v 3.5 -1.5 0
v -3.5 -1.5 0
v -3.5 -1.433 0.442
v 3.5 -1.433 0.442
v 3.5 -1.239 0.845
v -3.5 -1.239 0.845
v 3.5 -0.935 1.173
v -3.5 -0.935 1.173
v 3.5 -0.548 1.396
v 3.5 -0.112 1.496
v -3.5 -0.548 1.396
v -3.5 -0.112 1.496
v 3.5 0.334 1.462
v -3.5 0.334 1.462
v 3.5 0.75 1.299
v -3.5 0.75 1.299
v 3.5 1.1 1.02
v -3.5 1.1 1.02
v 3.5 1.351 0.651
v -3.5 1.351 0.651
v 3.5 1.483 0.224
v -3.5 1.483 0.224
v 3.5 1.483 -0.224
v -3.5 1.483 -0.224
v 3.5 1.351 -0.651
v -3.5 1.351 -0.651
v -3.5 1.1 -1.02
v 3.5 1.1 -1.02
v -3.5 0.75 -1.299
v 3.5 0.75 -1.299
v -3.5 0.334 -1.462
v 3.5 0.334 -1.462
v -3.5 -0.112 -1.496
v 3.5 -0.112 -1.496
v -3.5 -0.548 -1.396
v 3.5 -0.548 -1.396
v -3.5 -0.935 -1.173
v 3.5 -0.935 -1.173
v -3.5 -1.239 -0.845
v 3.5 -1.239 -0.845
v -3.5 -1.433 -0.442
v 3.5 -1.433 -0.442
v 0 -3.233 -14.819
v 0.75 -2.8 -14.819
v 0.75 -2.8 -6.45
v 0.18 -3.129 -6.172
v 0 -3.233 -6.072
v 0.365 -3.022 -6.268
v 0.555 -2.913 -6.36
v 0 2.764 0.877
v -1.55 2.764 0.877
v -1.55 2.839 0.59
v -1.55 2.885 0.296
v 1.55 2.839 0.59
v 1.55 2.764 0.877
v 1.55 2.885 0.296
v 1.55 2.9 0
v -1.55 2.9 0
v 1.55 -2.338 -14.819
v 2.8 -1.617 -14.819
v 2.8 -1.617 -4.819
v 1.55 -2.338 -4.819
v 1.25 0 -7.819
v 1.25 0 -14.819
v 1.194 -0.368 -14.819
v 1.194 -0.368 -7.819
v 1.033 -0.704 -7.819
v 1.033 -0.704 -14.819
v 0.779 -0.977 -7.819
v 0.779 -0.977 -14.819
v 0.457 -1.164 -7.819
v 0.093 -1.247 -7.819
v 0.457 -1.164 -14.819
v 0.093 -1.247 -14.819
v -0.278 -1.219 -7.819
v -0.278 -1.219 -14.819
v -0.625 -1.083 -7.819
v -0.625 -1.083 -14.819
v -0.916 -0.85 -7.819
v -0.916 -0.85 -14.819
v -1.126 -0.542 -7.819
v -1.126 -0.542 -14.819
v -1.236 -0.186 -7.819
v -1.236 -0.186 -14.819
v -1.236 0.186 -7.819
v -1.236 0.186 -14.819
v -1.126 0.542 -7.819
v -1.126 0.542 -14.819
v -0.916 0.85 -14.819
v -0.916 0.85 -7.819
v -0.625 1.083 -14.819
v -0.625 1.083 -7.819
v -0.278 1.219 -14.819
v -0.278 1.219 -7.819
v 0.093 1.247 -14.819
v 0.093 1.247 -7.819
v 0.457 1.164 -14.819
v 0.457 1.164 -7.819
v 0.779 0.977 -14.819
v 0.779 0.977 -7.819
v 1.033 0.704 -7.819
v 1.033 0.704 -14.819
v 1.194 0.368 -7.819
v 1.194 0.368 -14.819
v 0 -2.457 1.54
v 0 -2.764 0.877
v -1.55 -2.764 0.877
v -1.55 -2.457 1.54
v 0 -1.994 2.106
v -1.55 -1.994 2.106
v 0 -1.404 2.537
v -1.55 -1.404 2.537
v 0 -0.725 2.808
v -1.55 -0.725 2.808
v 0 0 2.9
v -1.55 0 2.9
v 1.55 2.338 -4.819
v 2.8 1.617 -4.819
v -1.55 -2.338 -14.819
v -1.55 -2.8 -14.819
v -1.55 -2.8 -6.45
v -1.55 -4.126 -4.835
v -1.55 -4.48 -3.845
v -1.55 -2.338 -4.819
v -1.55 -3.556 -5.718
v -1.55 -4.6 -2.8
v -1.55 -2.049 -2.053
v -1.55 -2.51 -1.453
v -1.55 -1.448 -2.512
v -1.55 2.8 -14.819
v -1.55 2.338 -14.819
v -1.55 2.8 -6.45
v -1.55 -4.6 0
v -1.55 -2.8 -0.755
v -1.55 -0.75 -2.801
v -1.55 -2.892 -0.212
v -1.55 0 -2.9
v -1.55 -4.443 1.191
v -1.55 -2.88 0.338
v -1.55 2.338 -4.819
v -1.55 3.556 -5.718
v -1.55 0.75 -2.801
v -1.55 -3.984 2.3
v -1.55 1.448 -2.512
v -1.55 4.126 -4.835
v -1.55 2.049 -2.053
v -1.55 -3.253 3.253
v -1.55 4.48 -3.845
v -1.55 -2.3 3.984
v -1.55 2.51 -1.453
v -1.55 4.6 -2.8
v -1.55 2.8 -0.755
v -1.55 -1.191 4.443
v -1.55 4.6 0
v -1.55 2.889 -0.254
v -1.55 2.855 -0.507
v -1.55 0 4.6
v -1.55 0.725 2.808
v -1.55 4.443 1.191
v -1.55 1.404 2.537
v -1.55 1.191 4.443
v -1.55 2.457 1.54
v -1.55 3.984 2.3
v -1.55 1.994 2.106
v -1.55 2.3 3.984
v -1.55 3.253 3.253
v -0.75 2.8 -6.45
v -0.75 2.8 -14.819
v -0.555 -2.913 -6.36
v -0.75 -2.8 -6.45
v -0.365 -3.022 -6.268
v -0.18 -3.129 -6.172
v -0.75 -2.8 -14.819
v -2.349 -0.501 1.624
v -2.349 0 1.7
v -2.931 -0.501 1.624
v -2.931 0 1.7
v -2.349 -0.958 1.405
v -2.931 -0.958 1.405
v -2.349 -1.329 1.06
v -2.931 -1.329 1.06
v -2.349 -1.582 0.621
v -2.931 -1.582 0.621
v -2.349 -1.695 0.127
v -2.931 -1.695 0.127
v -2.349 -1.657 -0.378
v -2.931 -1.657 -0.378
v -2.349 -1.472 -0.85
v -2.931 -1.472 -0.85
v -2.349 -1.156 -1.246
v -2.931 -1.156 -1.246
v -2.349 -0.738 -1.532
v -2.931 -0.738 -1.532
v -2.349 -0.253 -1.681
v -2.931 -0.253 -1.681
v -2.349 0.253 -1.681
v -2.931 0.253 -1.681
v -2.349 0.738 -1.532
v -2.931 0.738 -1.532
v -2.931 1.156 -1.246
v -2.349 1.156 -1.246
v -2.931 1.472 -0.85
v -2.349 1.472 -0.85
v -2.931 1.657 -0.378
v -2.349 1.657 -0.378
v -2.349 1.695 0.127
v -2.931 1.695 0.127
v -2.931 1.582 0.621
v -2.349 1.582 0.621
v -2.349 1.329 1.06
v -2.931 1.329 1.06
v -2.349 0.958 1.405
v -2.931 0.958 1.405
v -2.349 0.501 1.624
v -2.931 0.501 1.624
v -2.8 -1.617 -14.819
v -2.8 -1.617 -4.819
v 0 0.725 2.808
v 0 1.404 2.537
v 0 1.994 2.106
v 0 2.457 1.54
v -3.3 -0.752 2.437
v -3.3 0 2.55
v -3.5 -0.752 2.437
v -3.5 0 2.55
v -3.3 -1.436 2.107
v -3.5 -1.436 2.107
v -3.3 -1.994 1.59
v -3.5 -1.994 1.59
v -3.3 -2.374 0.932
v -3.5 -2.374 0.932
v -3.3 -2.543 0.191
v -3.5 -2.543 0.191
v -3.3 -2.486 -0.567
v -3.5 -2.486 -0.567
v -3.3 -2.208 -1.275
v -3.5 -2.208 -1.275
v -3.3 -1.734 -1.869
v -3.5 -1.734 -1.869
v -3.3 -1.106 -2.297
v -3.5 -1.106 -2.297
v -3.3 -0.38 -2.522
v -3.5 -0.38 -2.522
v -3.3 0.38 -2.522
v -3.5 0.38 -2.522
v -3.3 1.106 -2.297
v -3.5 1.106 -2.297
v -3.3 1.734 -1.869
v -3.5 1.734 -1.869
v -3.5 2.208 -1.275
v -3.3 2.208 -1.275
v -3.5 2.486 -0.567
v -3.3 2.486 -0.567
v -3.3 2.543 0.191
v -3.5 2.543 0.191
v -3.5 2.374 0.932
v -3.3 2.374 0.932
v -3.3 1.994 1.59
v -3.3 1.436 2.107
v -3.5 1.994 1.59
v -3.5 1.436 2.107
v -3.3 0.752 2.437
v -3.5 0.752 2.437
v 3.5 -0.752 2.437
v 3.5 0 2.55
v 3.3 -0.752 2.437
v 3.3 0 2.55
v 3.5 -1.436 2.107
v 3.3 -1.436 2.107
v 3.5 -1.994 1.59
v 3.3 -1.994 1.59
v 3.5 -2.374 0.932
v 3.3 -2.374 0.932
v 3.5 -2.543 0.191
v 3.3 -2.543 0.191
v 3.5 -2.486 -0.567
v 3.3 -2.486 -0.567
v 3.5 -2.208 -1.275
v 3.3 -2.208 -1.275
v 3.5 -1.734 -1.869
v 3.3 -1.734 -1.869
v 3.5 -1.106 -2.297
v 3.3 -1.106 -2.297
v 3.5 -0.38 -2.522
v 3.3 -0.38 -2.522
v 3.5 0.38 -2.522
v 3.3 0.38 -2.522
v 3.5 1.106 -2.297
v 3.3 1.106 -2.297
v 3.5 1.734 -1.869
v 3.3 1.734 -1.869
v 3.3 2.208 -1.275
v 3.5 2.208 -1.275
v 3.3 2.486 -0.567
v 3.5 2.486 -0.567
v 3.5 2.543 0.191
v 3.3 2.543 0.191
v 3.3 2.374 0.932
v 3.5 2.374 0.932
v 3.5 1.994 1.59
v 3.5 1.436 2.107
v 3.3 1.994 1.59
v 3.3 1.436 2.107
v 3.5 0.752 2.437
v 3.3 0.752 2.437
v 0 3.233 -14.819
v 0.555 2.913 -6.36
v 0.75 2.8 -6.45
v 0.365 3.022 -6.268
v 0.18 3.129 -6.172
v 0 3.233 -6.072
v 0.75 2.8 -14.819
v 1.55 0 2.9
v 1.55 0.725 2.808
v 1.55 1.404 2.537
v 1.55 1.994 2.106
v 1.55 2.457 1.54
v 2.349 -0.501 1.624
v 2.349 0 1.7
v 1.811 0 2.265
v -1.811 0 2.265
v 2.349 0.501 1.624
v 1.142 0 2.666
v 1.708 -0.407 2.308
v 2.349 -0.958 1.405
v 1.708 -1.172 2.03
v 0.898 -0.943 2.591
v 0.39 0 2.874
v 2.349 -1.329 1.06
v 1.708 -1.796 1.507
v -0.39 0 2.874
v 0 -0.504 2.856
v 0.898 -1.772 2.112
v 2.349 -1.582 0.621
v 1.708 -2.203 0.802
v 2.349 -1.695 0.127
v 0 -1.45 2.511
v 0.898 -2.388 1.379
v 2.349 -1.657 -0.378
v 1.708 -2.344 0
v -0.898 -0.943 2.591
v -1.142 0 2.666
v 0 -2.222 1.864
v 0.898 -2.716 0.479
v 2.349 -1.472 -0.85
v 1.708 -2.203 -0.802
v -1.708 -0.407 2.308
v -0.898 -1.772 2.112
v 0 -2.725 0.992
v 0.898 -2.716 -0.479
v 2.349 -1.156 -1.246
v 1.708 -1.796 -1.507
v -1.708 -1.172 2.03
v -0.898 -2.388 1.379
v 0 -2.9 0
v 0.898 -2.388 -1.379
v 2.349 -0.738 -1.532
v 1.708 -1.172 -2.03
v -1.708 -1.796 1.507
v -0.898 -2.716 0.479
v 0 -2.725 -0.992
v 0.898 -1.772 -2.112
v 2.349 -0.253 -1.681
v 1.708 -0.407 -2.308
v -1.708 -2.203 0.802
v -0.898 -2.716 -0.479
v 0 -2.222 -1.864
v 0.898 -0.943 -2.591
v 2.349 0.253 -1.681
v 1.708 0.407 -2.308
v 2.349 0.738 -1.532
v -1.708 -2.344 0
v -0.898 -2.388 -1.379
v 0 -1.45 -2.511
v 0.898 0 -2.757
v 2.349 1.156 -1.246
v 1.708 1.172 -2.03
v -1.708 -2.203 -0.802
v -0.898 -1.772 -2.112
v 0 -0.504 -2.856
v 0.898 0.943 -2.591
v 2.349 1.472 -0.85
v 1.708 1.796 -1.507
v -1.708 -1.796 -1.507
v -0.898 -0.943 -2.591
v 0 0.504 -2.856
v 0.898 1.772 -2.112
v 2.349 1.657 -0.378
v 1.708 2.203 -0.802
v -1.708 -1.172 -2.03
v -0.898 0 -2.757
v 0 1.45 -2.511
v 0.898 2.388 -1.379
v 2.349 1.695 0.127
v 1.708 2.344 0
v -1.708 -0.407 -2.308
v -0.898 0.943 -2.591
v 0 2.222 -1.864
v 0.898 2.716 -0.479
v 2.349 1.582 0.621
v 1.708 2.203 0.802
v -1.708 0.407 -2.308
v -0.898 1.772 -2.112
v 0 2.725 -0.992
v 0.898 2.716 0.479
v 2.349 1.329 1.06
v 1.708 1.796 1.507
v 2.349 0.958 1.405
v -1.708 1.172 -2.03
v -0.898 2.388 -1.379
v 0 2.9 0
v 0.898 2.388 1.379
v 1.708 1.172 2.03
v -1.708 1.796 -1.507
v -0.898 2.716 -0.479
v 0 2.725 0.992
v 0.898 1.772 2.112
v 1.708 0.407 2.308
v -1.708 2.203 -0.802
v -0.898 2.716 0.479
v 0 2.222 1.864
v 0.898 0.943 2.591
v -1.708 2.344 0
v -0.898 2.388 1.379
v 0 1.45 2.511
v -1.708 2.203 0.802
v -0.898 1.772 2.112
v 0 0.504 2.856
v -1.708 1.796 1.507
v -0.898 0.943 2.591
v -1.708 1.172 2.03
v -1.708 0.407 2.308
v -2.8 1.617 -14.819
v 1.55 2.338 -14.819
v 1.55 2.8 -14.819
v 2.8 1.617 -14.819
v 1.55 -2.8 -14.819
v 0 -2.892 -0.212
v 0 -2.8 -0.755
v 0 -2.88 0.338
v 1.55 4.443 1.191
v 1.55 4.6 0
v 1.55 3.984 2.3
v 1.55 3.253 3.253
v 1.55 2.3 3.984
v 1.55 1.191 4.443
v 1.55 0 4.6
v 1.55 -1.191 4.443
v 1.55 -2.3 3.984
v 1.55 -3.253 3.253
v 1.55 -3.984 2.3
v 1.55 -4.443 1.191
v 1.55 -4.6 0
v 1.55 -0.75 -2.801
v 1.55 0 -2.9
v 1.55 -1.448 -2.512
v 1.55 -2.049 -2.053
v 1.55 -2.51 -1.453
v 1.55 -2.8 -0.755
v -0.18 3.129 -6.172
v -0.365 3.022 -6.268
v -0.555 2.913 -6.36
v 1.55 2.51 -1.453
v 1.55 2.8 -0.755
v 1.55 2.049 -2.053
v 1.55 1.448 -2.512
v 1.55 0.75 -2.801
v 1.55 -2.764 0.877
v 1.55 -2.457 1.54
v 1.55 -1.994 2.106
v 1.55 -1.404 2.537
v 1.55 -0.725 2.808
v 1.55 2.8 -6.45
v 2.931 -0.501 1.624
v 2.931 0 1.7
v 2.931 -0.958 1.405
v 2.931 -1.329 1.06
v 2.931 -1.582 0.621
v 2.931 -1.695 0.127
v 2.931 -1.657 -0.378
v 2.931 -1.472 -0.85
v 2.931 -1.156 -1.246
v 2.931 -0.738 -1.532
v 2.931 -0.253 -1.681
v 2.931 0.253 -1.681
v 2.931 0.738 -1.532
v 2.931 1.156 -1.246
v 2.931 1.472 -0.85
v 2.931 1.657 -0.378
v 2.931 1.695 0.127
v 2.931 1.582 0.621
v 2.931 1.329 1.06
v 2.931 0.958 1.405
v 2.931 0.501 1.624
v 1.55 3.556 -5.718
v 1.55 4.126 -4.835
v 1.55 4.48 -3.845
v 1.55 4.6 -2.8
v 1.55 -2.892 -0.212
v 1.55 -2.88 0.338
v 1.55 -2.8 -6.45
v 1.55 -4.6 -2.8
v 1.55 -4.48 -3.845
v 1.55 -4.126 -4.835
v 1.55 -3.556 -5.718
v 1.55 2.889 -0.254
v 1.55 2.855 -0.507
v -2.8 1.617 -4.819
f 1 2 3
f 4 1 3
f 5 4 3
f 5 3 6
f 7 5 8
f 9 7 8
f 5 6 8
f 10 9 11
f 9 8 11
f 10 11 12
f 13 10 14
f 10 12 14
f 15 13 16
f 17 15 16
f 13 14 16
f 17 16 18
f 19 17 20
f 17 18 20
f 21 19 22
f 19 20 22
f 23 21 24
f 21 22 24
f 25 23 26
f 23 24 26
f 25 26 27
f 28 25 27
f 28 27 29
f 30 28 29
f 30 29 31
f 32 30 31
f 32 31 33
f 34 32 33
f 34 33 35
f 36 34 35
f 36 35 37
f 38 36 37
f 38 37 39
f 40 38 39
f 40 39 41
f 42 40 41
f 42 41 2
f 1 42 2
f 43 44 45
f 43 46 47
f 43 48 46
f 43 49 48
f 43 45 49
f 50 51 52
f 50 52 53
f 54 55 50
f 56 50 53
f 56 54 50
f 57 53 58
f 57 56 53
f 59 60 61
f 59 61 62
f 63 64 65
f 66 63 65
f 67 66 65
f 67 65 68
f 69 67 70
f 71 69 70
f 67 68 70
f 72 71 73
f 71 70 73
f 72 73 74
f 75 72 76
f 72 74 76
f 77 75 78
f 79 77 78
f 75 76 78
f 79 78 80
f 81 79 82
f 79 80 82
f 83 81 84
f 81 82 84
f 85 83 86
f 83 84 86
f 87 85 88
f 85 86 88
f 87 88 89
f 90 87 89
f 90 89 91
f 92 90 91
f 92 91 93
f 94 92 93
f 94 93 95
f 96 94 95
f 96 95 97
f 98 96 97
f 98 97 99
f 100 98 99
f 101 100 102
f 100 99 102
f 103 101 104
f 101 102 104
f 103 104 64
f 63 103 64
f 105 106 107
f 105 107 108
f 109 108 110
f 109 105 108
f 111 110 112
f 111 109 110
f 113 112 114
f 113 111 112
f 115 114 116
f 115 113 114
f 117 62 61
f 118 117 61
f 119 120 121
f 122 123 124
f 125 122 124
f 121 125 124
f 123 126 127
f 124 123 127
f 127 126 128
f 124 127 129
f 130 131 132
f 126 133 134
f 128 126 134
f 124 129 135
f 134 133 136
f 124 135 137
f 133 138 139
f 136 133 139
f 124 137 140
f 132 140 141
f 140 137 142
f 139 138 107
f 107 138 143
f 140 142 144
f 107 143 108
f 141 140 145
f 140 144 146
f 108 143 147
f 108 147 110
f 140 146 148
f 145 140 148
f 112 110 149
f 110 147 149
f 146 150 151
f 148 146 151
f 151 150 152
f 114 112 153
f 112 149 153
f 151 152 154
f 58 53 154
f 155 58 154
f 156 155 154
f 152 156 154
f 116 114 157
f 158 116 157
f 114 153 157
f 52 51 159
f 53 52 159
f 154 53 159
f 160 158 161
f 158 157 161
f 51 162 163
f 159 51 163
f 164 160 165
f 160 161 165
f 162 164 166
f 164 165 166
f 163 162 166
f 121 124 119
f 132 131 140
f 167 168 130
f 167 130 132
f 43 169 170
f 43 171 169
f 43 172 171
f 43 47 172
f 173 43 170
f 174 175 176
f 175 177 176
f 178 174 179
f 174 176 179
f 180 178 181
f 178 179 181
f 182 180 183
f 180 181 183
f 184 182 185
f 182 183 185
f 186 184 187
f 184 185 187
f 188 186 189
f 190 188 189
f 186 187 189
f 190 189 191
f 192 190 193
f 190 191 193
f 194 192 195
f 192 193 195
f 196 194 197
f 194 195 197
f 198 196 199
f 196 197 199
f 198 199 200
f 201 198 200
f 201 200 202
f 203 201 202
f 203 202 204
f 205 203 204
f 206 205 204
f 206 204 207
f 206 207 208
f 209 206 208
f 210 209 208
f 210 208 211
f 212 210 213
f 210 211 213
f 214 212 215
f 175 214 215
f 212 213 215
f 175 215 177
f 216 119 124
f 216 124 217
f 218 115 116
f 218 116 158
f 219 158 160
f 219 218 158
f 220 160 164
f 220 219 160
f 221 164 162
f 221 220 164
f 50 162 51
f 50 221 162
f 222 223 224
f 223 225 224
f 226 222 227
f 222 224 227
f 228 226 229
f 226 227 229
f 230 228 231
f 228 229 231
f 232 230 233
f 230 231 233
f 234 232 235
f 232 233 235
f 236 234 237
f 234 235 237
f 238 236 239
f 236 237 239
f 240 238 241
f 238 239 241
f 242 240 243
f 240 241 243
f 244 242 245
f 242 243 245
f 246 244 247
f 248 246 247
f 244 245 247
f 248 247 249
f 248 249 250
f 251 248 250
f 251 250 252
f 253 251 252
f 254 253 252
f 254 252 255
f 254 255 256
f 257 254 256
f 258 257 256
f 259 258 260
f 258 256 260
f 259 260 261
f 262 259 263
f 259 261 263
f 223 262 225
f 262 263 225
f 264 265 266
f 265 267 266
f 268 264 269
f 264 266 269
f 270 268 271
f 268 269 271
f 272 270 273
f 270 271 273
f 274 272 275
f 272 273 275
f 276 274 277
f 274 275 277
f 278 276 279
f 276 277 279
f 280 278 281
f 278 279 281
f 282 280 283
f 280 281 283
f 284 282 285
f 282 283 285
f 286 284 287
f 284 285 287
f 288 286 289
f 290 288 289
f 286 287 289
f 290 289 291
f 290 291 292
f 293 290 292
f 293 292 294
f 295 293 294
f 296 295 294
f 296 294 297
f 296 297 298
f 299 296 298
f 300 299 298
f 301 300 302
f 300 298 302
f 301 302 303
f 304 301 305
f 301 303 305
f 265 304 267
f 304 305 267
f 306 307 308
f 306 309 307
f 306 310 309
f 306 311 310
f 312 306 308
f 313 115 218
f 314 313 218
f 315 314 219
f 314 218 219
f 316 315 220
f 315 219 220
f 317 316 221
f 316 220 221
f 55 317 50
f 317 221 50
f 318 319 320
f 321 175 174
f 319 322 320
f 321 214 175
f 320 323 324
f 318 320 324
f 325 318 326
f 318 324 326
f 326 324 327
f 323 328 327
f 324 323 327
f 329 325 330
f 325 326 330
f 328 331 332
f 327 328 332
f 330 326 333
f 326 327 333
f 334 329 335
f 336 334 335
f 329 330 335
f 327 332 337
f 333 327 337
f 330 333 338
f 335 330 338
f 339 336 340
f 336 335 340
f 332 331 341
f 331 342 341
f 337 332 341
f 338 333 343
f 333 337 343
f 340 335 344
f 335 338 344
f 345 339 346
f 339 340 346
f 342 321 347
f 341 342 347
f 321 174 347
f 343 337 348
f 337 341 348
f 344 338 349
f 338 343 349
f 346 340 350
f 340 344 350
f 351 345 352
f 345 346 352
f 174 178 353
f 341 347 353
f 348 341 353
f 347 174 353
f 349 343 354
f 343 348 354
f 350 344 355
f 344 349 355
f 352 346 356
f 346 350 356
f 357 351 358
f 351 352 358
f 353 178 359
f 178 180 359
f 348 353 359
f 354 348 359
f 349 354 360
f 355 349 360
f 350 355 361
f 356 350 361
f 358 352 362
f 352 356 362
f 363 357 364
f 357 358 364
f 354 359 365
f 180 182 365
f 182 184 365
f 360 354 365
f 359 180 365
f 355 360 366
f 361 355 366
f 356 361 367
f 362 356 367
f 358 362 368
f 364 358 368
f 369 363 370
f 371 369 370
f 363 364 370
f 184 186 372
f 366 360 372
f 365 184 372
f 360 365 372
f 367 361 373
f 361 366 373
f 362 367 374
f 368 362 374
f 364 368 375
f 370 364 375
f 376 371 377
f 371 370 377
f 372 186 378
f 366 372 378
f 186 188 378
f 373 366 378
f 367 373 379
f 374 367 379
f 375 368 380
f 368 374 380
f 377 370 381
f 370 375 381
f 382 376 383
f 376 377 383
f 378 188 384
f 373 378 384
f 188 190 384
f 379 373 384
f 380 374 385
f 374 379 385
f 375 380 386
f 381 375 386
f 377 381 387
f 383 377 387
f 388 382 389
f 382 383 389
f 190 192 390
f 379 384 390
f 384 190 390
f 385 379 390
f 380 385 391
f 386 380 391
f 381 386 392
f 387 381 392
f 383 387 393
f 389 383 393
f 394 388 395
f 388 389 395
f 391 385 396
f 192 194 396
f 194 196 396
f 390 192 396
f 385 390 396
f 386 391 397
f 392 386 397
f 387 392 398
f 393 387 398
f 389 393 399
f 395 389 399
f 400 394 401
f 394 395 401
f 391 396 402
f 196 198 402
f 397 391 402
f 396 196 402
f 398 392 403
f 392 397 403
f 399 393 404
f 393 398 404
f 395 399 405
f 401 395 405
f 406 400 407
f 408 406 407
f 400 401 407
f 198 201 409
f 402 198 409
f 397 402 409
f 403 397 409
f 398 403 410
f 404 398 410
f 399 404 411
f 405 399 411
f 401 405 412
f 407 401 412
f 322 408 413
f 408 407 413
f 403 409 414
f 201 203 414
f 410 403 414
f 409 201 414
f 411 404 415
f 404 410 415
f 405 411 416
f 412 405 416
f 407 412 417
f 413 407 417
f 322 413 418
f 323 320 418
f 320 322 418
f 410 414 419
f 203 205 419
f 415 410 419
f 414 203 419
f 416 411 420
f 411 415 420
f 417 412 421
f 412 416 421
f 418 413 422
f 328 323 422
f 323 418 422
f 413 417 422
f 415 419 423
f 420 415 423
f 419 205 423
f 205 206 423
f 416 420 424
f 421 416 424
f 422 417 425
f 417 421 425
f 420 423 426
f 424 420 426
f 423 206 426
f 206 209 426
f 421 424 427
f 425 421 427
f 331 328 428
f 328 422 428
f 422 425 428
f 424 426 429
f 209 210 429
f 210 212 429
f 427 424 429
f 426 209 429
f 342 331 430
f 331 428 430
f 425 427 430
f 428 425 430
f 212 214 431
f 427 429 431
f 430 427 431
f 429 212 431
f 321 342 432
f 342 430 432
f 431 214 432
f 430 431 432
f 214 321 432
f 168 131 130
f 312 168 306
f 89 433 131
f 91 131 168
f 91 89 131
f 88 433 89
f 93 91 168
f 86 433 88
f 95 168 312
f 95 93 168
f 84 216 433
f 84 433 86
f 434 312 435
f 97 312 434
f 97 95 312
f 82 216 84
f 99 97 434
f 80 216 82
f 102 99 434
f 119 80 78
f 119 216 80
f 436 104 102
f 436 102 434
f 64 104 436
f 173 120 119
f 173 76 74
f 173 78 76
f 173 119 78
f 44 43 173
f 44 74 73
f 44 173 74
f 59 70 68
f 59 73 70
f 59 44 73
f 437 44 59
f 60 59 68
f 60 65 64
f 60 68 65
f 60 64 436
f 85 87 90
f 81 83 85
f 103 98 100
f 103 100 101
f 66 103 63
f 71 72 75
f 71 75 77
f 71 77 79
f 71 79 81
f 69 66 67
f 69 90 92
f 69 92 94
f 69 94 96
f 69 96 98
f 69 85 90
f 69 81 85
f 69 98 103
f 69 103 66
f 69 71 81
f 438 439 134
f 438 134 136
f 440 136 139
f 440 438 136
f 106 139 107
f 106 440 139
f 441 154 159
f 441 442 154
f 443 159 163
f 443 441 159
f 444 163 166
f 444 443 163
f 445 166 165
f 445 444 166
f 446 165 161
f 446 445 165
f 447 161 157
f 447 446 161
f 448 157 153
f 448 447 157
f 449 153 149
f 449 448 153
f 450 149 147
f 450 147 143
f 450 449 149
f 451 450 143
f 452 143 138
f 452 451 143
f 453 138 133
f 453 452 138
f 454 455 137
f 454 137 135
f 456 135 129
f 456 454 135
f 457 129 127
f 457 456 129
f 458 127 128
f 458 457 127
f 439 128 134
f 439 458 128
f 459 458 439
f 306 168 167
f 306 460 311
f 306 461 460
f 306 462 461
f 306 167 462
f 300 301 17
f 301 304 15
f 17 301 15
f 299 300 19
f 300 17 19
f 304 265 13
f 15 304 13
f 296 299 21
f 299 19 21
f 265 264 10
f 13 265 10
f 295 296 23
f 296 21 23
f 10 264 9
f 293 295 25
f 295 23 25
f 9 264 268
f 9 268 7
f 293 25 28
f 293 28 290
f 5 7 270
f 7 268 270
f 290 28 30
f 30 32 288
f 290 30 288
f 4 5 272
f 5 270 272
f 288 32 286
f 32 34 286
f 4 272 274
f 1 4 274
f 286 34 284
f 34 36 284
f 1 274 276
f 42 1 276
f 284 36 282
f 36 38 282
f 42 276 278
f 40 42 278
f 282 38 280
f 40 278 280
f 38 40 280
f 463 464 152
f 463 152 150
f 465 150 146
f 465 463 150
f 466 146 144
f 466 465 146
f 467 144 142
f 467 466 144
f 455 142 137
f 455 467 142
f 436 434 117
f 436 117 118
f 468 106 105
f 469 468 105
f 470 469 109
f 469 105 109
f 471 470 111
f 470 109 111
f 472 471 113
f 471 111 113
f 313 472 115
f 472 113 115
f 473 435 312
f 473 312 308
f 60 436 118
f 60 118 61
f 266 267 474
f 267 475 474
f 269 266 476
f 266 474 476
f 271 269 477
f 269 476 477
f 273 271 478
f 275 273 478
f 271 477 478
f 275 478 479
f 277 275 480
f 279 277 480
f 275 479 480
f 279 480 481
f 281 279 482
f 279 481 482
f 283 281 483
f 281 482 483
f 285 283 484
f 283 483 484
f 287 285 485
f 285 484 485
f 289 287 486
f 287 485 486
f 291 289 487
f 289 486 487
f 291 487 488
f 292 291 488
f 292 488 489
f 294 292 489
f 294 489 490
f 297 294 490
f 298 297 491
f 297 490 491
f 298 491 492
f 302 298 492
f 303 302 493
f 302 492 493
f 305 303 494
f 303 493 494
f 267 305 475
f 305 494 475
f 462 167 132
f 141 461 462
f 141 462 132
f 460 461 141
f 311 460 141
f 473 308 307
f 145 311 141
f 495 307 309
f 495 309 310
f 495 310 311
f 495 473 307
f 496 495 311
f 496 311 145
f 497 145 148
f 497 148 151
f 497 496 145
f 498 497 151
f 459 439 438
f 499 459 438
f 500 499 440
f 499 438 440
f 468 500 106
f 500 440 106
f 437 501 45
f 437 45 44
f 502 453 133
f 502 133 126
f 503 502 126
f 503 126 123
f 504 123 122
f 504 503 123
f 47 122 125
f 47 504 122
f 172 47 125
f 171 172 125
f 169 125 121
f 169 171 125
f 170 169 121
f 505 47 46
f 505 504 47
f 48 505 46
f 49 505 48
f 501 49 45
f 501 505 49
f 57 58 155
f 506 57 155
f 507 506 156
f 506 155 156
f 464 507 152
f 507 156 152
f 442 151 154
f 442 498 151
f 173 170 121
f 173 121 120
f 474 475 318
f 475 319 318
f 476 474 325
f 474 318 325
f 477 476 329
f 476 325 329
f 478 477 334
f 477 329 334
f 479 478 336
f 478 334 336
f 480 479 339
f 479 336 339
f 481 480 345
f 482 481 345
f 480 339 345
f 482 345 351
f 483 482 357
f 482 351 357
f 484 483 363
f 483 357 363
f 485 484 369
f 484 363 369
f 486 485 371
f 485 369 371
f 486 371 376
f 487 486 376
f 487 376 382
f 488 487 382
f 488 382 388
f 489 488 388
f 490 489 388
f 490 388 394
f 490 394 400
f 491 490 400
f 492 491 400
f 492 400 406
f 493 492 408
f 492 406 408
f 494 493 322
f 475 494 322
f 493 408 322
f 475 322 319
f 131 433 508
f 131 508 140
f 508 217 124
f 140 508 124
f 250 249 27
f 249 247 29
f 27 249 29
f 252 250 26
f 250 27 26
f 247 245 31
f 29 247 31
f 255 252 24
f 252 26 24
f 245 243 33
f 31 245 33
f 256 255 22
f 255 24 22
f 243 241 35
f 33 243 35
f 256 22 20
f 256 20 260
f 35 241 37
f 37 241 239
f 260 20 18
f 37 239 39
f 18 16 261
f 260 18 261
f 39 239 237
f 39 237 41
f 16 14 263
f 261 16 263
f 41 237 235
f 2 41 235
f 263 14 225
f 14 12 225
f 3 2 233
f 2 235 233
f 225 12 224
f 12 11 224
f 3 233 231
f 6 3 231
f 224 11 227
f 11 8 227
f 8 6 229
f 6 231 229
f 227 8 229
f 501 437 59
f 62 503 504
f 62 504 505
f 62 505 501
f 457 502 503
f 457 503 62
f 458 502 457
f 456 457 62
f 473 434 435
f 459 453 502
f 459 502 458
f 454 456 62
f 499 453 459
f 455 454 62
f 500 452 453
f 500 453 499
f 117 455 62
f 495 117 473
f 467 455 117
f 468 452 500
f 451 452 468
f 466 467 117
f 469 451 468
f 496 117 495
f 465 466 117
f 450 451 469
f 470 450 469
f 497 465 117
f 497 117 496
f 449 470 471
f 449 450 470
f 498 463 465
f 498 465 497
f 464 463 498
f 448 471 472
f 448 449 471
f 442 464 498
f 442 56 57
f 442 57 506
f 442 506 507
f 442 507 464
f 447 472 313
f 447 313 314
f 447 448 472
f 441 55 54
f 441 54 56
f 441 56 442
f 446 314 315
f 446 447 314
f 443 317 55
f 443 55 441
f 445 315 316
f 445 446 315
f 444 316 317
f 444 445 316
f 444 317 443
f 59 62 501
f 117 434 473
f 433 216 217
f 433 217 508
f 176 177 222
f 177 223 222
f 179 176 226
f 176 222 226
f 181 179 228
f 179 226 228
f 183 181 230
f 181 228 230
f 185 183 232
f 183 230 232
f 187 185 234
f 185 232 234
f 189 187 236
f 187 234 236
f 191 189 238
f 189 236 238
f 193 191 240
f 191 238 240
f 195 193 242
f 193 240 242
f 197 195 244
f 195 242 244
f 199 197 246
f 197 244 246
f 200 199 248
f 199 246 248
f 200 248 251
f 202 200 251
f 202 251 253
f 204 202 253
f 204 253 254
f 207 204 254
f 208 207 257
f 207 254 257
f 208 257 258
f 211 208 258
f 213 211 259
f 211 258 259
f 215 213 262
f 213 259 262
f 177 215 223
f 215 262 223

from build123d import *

# Parameters (mm, degrees)
F2_R     = 1.5
F3_DEPTH = 7.001
F5_DEPTH = 1.55
F7_DEPTH = 10
F6_R     = 1.25
F8_DEPTH = 7


# Not quite as in the source:
# - a feature names something its author has since deleted; it is built from what else it names


with BuildPart() as f1:
    # F0 (on Front) → F1 (revolve)
    with BuildSketch(Plane.XZ):
        with BuildLine():
            ThreePointArc((2.3494680249, 1.7), (2.7589361421, 0.8934603315), (2.9, 0))
            Line((2.9, 0), (3.5, 0))
            Line((3.5, 0), (3.5, 2.55))
            Line((3.5, 2.55), (3.3, 2.55))
            Line((3.3, 2.55), (2.9305491433, 1.7))
            Line((2.9305491433, 1.7), (2.3494680249, 1.7))
        make_face()
        with BuildLine():
            Line((-2.9, 0), (2.9, 0))
            ThreePointArc((2.9, 0), (2.7589361421, 0.8934603315), (2.3494680249, 1.7))
            ThreePointArc((2.3494680249, 1.7), (0, 2.9), (-2.3494680249, 1.7))
            ThreePointArc((-2.3494680249, 1.7), (-2.7589361421, 0.8934603315), (-2.9, 0))
        make_face()
        with BuildLine():
            Line((-3.5, 0), (-2.9, 0))
            ThreePointArc((-2.9, 0), (-2.7589361421, 0.8934603315), (-2.3494680249, 1.7))
            Line((-2.3494680249, 1.7), (-2.9305491433, 1.7))
            Line((-2.9305491433, 1.7), (-3.3, 2.55))
            Line((-3.3, 2.55), (-3.5, 2.55))
            Line((-3.5, 2.55), (-3.5, 0))
        make_face()
    revolve(axis=Axis((1.75, 0, 0), (1, 0, 0)))

    # F2 (on face) → F3 (cut, through all)
    with BuildSketch(Plane(origin=(-3.5, 0, 0), x_dir=(0, -1, 0), z_dir=(-1, 0, 0))):
        Circle(F2_R)
    extrude(amount=-F3_DEPTH, mode=Mode.SUBTRACT)


with BuildPart() as f5:
    # F4 (on Right) → F5 (new body, symmetric)
    with BuildSketch(Plane.YZ):
        with BuildLine():
            ThreePointArc((4.38178046, -1.4), (4.5451177166, -0.708452498), (4.6, 0))
            ThreePointArc((4.6, 0), (0, 4.6), (-4.6, 0))
            ThreePointArc((-4.6, 0), (-4.5451177166, -0.708452498), (-4.38178046, -1.4))
            ThreePointArc((-4.38178046, -1.4), (-3.7499980255, -0.1358838598), (-2.7642805233, 0.8767857143))
            ThreePointArc((-2.7642805233, 0.8767857143), (-1.7127932491, 2.3401579617), (0, 2.9))
            ThreePointArc((0, 2.9), (1.7127932491, 2.3401579617), (2.7642805233, 0.8767857143))
            ThreePointArc((2.7642805233, 0.8767857143), (3.7499980255, -0.1358838598), (4.38178046, -1.4))
        make_face()
        with BuildLine():
            ThreePointArc((-2.8, -3.6496575182), (-3.7629419848, -2.6458018858), (-4.38178046, -1.4))
            ThreePointArc((-4.38178046, -1.4), (-4.5451177166, -2.091547502), (-4.6, -2.8))
            ThreePointArc((-4.6, -2.8), (-4.1255302689, -4.8346989949), (-2.8, -6.4496575182))
            Line((-2.8, -6.4496575182), (-2.8, -3.6496575182))
        make_face()
        with BuildLine():
            ThreePointArc((-4.38178046, -1.4), (-4.5451177166, -0.708452498), (-4.6, 0))
            Line((-4.6, 0), (-4.6, -2.8))
            ThreePointArc((-4.6, -2.8), (-4.5451177166, -2.091547502), (-4.38178046, -1.4))
        make_face()
        with BuildLine():
            Line((4.6, -2.8), (4.6, 0))
            ThreePointArc((4.6, 0), (4.5451177166, -0.708452498), (4.38178046, -1.4))
            ThreePointArc((4.38178046, -1.4), (4.5451177166, -2.091547502), (4.6, -2.8))
        make_face()
        with BuildLine():
            ThreePointArc((-2.7642805233, 0.8767857143), (-3.7499980255, -0.1358838598), (-4.38178046, -1.4))
            ThreePointArc((-4.38178046, -1.4), (-3.7629419848, -2.6458018858), (-2.8, -3.6496575182))
            Line((-2.8, -3.6496575182), (-2.8, -0.7549834435))
            ThreePointArc((-2.8, -0.7549834435), (-2.8993054481, 0.0634658849), (-2.7642805233, 0.8767857143))
        make_face()
        with BuildLine():
            Line((2.8, -14.8188183084), (2.8, -6.4496575182))
            ThreePointArc((2.8, -6.4496575182), (0, -7.4), (-2.8, -6.4496575182))
            Line((-2.8, -6.4496575182), (-2.8, -14.8188183084))
            Line((-2.8, -14.8188183084), (0, -14.8188183084))
            Line((0, -14.8188183084), (2.8, -14.8188183084))
        make_face()
        with BuildLine():
            Line((2.8, -6.4496575182), (2.8, -3.6496575182))
            ThreePointArc((2.8, -3.6496575182), (0, -4.6), (-2.8, -3.6496575182))
            Line((-2.8, -3.6496575182), (-2.8, -6.4496575182))
            ThreePointArc((-2.8, -6.4496575182), (0, -7.4), (2.8, -6.4496575182))
        make_face()
        with BuildLine():
            ThreePointArc((-2.8, -3.6496575182), (0, -4.6), (2.8, -3.6496575182))
            Line((2.8, -3.6496575182), (2.8, -0.7549834435))
            ThreePointArc((2.8, -0.7549834435), (1.7635968947, -2.3021133754), (0, -2.9))
            ThreePointArc((0, -2.9), (-1.7635968947, -2.3021133754), (-2.8, -0.7549834435))
            Line((-2.8, -0.7549834435), (-2.8, -3.6496575182))
        make_face()
        with BuildLine():
            ThreePointArc((4.6, -2.8), (4.5451177166, -2.091547502), (4.38178046, -1.4))
            ThreePointArc((4.38178046, -1.4), (3.7629419848, -2.6458018858), (2.8, -3.6496575182))
            Line((2.8, -3.6496575182), (2.8, -6.4496575182))
            ThreePointArc((2.8, -6.4496575182), (4.1255302689, -4.8346989949), (4.6, -2.8))
        make_face()
        with BuildLine():
            ThreePointArc((2.8, -3.6496575182), (3.7629419848, -2.6458018858), (4.38178046, -1.4))
            ThreePointArc((4.38178046, -1.4), (3.7499980255, -0.1358838598), (2.7642805233, 0.8767857143))
            ThreePointArc((2.7642805233, 0.8767857143), (2.865869285, 0.4436138425), (2.9, 0))
            ThreePointArc((2.9, 0), (2.8748913023, -0.3807886553), (2.8, -0.7549834435))
            Line((2.8, -0.7549834435), (2.8, -3.6496575182))
        make_face()
    extrude(amount=F5_DEPTH, both=True)

    # F6 (on face) → F7 (join)
    with BuildSketch(Plane(origin=(0, 0, -14.8188183084), x_dir=(1, 0, 0), z_dir=(0, 0, -1))):
        Polygon((-2.8, 1.6165807537), (-2.8, -1.6165807537), (-1.55, -2.3382685902), (-1.55, 2.3382685902), align=None)
        Polygon((0, 3.2331615075), (-0.7502577388, 2.8), (0.7502577388, 2.8), align=None)
        Polygon((1.55, 2.3382685902), (1.55, -2.3382685902), (2.8, -1.6165807537), (2.8, 1.6165807537), align=None)
        Polygon((0.7502577388, -2.8), (-0.7502577388, -2.8), (0, -3.2331615075), align=None)
    extrude(amount=-F7_DEPTH)

    # F6 (on face) → F8 (cut)
    with BuildSketch(Plane(origin=(0, 0, -14.8188183084), x_dir=(1, 0, 0), z_dir=(0, 0, -1))):
        Circle(F6_R)
    extrude(amount=-F8_DEPTH, mode=Mode.SUBTRACT)


solid = Compound([f1.part, f5.part])
